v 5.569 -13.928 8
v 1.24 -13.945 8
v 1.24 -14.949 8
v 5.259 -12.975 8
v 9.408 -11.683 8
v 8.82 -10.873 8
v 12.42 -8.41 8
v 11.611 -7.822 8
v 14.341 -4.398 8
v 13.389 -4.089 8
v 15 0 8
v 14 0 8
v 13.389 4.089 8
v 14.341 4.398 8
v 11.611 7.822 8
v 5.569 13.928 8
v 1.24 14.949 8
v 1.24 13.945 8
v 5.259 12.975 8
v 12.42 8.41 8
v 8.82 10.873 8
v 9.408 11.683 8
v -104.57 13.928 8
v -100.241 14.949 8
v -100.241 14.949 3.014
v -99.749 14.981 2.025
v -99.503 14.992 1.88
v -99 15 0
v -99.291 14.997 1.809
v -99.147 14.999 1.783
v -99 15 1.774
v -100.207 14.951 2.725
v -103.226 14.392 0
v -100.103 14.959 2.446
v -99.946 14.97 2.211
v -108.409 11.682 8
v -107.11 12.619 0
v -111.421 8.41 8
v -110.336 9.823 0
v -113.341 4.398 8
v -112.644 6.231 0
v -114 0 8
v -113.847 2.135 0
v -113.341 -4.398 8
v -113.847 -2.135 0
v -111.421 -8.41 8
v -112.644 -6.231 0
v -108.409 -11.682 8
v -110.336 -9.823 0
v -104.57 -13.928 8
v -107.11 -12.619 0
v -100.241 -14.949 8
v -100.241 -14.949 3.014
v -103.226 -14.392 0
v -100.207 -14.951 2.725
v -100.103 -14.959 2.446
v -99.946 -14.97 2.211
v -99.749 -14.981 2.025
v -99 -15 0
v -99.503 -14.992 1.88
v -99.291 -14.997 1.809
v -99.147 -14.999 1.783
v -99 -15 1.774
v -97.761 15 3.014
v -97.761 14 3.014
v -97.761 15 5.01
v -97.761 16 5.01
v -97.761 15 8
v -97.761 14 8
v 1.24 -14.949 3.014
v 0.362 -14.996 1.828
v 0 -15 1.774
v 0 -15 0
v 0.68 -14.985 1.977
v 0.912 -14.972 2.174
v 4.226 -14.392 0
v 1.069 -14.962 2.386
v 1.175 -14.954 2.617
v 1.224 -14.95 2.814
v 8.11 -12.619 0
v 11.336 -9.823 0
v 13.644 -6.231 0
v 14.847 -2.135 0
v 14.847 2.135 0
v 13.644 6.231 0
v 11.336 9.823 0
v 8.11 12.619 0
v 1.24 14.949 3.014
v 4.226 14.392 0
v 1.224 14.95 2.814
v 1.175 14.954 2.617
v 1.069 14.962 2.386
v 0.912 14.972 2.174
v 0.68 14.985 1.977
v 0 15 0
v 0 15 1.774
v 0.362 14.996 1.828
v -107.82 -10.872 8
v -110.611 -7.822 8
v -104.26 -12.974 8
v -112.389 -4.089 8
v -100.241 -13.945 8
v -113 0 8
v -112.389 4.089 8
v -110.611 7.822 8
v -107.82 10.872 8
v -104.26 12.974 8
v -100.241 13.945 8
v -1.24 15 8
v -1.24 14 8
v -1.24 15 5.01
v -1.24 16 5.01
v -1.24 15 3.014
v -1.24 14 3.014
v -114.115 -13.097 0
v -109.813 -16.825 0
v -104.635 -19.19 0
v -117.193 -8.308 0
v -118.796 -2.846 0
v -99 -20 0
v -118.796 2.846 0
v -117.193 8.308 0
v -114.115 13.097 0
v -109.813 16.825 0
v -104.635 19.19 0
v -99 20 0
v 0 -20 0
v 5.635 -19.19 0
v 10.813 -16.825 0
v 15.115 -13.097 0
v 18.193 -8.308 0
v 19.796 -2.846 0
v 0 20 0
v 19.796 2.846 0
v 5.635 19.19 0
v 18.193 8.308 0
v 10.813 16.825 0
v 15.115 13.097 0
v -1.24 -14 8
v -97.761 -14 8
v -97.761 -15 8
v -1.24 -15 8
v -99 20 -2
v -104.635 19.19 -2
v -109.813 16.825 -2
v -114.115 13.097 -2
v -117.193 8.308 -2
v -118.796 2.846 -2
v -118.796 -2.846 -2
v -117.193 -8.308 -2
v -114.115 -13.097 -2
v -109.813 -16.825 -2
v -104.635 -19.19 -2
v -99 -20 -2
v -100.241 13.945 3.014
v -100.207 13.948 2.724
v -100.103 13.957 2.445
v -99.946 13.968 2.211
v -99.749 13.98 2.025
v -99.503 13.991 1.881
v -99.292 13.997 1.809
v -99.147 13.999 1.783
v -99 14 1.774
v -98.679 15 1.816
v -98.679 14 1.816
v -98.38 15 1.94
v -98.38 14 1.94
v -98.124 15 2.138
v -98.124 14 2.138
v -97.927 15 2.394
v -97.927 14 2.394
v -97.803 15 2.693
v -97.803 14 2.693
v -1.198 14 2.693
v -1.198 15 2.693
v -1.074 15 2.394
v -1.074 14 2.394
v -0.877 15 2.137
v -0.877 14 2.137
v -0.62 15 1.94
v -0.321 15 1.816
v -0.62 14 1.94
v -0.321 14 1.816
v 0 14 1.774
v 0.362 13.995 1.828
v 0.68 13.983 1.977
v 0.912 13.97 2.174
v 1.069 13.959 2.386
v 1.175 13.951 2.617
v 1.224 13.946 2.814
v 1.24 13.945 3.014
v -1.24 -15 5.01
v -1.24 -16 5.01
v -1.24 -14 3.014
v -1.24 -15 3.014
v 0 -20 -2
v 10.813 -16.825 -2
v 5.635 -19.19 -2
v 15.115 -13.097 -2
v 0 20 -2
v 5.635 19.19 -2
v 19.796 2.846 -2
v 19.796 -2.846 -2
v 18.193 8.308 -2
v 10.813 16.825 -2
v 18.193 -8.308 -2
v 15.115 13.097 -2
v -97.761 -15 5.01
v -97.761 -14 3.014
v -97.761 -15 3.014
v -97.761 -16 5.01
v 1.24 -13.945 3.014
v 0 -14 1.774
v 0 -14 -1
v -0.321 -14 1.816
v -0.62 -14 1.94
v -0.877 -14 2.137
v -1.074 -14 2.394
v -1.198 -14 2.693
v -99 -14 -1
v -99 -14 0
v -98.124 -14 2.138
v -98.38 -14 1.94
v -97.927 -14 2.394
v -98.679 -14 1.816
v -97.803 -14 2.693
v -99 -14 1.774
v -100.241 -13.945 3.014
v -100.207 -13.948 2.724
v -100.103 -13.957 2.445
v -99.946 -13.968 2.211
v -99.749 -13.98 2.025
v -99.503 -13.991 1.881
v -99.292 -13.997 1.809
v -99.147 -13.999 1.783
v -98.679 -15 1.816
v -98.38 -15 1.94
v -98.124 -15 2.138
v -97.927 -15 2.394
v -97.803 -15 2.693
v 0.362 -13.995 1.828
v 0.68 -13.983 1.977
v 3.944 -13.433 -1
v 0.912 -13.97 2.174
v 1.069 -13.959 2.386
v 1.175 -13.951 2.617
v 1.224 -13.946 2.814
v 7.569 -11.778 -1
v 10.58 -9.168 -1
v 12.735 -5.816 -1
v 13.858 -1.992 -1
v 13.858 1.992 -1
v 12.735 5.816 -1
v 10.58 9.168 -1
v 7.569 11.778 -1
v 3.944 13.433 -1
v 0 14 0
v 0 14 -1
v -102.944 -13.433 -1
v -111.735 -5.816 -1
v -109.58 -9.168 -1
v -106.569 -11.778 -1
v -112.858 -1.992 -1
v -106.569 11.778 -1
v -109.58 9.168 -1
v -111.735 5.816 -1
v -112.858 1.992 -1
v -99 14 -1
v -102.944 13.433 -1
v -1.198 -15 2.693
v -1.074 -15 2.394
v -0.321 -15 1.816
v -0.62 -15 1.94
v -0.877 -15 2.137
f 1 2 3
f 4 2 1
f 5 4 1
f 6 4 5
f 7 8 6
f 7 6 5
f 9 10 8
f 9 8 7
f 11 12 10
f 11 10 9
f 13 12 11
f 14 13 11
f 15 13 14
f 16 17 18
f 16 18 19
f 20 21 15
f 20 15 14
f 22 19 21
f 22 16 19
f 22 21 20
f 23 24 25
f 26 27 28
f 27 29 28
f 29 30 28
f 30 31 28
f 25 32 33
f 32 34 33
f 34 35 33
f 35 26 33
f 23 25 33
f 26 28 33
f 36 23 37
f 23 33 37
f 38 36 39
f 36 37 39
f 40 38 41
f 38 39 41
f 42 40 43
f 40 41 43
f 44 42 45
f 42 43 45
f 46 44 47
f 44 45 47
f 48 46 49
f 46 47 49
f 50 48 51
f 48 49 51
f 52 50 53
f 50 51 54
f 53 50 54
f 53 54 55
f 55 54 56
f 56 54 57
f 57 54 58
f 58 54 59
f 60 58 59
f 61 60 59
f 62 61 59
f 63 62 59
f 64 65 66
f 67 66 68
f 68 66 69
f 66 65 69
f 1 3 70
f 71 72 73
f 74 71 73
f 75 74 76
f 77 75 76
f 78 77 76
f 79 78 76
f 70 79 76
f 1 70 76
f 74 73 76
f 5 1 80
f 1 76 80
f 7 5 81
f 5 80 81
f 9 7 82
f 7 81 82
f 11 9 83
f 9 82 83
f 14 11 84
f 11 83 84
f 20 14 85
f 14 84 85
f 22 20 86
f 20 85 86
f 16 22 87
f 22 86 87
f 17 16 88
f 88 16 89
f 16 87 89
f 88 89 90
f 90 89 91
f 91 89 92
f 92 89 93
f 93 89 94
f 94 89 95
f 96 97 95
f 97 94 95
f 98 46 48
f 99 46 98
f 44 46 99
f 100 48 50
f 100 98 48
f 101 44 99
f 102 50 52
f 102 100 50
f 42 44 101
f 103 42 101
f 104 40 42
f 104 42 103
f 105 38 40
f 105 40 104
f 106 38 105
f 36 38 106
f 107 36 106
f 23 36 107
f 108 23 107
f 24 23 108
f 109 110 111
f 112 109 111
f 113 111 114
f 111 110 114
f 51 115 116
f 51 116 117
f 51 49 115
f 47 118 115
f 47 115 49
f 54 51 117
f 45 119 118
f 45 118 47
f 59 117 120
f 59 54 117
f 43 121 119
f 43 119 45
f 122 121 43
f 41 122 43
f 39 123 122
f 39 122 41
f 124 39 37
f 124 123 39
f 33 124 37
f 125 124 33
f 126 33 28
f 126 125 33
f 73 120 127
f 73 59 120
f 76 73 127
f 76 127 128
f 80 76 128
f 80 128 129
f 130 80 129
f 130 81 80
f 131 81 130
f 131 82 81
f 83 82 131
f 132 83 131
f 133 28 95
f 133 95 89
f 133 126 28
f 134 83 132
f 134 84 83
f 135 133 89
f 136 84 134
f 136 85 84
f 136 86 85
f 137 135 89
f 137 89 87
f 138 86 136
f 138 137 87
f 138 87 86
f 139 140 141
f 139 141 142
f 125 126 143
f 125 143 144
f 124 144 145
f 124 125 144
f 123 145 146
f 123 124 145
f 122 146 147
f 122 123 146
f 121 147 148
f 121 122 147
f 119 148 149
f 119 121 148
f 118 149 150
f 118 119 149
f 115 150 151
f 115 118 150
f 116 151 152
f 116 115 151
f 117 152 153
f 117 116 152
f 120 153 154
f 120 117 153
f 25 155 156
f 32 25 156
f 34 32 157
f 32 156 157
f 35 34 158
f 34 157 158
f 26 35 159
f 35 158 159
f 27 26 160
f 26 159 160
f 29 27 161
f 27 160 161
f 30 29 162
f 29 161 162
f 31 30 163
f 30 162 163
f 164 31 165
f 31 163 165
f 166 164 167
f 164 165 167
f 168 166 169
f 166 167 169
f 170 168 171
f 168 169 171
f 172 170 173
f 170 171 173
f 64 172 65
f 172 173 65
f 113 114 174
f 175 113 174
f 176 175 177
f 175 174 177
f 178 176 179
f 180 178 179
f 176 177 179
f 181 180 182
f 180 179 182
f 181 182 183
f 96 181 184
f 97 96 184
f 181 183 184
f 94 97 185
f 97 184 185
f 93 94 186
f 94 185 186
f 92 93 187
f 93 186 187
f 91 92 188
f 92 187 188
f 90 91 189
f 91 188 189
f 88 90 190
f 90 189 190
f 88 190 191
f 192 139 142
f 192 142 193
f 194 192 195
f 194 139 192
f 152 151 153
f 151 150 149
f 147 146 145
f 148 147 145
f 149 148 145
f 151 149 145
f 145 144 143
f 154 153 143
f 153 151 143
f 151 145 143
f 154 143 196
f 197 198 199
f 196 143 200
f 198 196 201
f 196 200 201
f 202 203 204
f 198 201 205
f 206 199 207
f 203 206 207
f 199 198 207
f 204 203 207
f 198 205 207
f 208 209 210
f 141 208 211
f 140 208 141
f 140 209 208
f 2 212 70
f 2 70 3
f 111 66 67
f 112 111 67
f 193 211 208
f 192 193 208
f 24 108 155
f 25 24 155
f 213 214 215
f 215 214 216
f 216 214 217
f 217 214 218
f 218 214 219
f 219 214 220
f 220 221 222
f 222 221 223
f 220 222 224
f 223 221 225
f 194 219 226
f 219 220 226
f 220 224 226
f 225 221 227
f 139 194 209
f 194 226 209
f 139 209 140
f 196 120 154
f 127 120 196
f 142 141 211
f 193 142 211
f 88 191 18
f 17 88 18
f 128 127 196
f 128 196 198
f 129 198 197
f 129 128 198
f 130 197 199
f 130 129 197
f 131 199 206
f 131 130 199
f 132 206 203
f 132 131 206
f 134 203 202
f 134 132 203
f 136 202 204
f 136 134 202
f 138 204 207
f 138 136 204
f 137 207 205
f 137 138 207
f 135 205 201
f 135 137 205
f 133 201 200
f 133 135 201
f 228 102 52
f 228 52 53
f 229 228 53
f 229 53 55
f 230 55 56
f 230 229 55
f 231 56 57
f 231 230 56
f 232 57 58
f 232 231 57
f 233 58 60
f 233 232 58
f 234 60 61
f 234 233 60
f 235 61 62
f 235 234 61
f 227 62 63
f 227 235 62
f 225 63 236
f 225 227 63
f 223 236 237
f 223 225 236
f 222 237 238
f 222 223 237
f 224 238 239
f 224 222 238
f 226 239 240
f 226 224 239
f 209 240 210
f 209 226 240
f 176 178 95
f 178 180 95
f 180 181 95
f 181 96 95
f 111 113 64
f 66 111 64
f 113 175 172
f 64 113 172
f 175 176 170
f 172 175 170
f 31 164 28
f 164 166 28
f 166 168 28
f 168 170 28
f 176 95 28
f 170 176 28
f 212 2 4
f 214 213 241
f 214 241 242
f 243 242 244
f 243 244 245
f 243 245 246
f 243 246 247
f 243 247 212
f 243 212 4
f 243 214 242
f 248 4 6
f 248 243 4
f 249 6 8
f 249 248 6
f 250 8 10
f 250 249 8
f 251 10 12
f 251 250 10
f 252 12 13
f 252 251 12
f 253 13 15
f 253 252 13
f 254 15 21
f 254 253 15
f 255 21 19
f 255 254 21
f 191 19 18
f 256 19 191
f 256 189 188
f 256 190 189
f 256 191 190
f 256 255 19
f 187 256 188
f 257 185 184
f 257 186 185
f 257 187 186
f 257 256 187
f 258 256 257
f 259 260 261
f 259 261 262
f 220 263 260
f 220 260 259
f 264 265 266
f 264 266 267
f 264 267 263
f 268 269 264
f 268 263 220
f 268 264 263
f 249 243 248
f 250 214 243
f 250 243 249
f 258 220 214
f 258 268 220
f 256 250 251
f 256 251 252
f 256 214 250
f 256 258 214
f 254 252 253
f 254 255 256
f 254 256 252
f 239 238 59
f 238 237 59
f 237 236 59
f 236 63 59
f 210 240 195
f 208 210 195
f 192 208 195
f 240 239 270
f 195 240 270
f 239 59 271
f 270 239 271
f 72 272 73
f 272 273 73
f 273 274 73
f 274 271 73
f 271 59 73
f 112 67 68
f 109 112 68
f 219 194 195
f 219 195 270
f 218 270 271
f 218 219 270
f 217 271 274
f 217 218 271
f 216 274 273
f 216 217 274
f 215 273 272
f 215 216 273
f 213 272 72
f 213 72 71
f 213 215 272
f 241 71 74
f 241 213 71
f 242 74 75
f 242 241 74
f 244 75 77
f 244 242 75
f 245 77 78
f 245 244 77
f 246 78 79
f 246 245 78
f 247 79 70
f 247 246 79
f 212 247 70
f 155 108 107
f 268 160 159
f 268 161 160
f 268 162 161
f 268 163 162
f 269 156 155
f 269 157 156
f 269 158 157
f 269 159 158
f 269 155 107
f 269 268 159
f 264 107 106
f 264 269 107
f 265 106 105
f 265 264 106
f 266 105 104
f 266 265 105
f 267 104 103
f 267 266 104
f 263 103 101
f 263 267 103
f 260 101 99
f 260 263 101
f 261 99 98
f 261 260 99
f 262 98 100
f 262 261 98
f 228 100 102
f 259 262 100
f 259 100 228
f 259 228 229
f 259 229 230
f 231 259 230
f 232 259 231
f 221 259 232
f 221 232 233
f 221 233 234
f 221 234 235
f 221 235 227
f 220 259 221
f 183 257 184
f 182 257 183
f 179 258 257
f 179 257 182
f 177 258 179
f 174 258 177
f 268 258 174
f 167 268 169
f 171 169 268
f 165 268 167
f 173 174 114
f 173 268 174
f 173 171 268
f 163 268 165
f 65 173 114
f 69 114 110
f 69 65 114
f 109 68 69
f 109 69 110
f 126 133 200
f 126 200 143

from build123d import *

# Parameters (mm, degrees)
F1_DEPTH      = 2
F2_DEPTH      = 8
F3_T          = 1
F3_T3_DEPTH   = 101
F3_T6_ANGLE   = 180.000000001
F3_T8_ANGLE   = 180.000000001
F7_DEPTH      = 25
F7_DEPTH_BACK = 25


# Not quite as in the source:
# - a shell that OpenCascade refuses in one call is made with other operations: the cavity is built on its own and cut out


with BuildPart() as f1:
    # F0 (on Top) → F1 (new body)
    with BuildSketch(Plane.XY):
        with BuildLine():
            Line((0, 19.999999553), (-99, 19.999999553))
            ThreePointArc((-99, 19.999999553), (-118.999999553, 0), (-99, -19.999999553))
            Line((-99, -19.999999553), (0, -19.999999553))
            ThreePointArc((0, -19.999999553), (19.999999553, 0), (0, 19.999999553))
        make_face()
        with BuildLine():
            ThreePointArc((0, 15), (15, 0), (0, -15))
            Line((0, -15), (-99, -15))
            ThreePointArc((-99, -15), (-114, 0), (-99, 15))
            Line((-99, 15), (0, 15))
        make_face(mode=Mode.SUBTRACT)
        with BuildLine():
            Line((-99, -15), (0, -15))
            ThreePointArc((0, -15), (15, 0), (0, 15))
            Line((0, 15), (-99, 15))
            ThreePointArc((-99, 15), (-114, 0), (-99, -15))
        make_face()
    extrude(amount=-F1_DEPTH)

    # F0 (on Top) → F2 (join)
    with BuildSketch(Plane.XY):
        with BuildLine():
            Line((-99, -15), (0, -15))
            ThreePointArc((0, -15), (15, 0), (0, 15))
            Line((0, 15), (-99, 15))
            ThreePointArc((-99, 15), (-114, 0), (-99, -15))
        make_face()
    extrude(amount=F2_DEPTH)

    # F3: shell of thickness 1, made by hand


with BuildPart() as f3_core1:
    # F3_t2: copy of F1
    add(f1.part)

    # the walls: a layer under each face that stays
    f3_faces = [f3_core1.faces().sort_by_distance(p)[0] for p in [
        (-49.5, -19.999999553, -1),
        (-118.999999553, 0, -1),
        (19.999999553, 0, -1),
        (-109.0714281883, -17.1428567597, 0),
        (-49.5, 0, -2),
        (-49.5, 19.999999553, -1),
        (-49.5, -15, 4),
        (15, 0, 4),
        (-49.5, 15, 4),
        (-114, 0, 4),
    ]]
    thicken(f3_faces, amount=-F3_T, mode=Mode.SUBTRACT)

    # F3_s4 → F3_t3 (cut)
    with BuildSketch(Plane.YZ.offset(-100)):
        Polygon((-15.01, 0.01), (-15, -1), (-14, -1), (-14, 0), align=None)
        Polygon((15.01, 0.01), (15, -1), (14, -1), (14, 0), align=None)
    extrude(amount=F3_T3_DEPTH, mode=Mode.SUBTRACT)

    # F3_s5 → F3_t6 (revolve, cut)
    with BuildSketch(Plane.YZ):
        Polygon((-15.01, 0.01), (-15, -1), (-14, -1), (-14, 0), align=None)
    revolve(axis=Axis((0, 0, 0), (0, 0, 1)), revolution_arc=F3_T6_ANGLE, mode=Mode.SUBTRACT)

    # F3_s7 → F3_t8 (revolve, cut)
    with BuildSketch(Plane.YZ.offset(-99)):
        Polygon((15.01, 0.01), (15, -1), (14, -1), (14, 0), align=None)
    revolve(axis=Axis((-99, 0, 0), (0, 0, 1)), revolution_arc=F3_T8_ANGLE, mode=Mode.SUBTRACT)


with BuildPart() as f1_1:
    add(f1.part)

    # what is left inside the walls is the cavity
    f3_cavity = [f3_core1.part.solids().sort_by_distance(p)[0] for p in [
        (-49.5, -4.666667, 7.99),
    ]]
    add(f3_cavity, mode=Mode.SUBTRACT)

    # F5: sweep along a path in F5_path
    with BuildLine(Plane(origin=(0, 15, 8), x_dir=(0, -1, 0), z_dir=(0, 0, -1))) as f5_path:
        Line((0, 0), (0, 99))
    # F4 (on Right) → F5 (sweep)
    with BuildSketch(Plane.YZ):
        Polygon((16, 5.01), (15, 8), (15, 5.01), align=None)
        Polygon((-15, 5.01), (-15, 8), (-16, 5.01), align=None)
    sweep(path=f5_path.line)

    # F6 (on Front) → F7 (cut, two sides)
    with BuildSketch(Plane.XZ) as f7_sk:
        with BuildLine():
            ThreePointArc((-100.2408070591, 3.0141202733), (-99.000737071, 1.7740502852), (-97.760667083, 3.0141202733))
            Line((-97.760667083, 3.0141202733), (-97.760667083, 9.1903032735))
            Line((-97.760667083, 9.1903032735), (-100.2408070591, 9.8686125129))
            Line((-100.2408070591, 9.8686125129), (-100.2408070591, 3.0141202733))
        make_face()
        with BuildLine():
            Line((-1.2400699881, 9.1903032735), (-1.2400699881, 3.0141202733))
            ThreePointArc((-1.2400699881, 3.0141202733), (0, 1.7740502852), (1.2400699881, 3.0141202733))
            Line((1.2400699881, 3.0141202733), (1.2400699881, 9.8686125129))
            Line((1.2400699881, 9.8686125129), (-1.2400699881, 9.1903032735))
        make_face()
    extrude(amount=-F7_DEPTH, mode=Mode.SUBTRACT)
    extrude(f7_sk.sketch, amount=F7_DEPTH_BACK, mode=Mode.SUBTRACT)


solid = f1_1.part
